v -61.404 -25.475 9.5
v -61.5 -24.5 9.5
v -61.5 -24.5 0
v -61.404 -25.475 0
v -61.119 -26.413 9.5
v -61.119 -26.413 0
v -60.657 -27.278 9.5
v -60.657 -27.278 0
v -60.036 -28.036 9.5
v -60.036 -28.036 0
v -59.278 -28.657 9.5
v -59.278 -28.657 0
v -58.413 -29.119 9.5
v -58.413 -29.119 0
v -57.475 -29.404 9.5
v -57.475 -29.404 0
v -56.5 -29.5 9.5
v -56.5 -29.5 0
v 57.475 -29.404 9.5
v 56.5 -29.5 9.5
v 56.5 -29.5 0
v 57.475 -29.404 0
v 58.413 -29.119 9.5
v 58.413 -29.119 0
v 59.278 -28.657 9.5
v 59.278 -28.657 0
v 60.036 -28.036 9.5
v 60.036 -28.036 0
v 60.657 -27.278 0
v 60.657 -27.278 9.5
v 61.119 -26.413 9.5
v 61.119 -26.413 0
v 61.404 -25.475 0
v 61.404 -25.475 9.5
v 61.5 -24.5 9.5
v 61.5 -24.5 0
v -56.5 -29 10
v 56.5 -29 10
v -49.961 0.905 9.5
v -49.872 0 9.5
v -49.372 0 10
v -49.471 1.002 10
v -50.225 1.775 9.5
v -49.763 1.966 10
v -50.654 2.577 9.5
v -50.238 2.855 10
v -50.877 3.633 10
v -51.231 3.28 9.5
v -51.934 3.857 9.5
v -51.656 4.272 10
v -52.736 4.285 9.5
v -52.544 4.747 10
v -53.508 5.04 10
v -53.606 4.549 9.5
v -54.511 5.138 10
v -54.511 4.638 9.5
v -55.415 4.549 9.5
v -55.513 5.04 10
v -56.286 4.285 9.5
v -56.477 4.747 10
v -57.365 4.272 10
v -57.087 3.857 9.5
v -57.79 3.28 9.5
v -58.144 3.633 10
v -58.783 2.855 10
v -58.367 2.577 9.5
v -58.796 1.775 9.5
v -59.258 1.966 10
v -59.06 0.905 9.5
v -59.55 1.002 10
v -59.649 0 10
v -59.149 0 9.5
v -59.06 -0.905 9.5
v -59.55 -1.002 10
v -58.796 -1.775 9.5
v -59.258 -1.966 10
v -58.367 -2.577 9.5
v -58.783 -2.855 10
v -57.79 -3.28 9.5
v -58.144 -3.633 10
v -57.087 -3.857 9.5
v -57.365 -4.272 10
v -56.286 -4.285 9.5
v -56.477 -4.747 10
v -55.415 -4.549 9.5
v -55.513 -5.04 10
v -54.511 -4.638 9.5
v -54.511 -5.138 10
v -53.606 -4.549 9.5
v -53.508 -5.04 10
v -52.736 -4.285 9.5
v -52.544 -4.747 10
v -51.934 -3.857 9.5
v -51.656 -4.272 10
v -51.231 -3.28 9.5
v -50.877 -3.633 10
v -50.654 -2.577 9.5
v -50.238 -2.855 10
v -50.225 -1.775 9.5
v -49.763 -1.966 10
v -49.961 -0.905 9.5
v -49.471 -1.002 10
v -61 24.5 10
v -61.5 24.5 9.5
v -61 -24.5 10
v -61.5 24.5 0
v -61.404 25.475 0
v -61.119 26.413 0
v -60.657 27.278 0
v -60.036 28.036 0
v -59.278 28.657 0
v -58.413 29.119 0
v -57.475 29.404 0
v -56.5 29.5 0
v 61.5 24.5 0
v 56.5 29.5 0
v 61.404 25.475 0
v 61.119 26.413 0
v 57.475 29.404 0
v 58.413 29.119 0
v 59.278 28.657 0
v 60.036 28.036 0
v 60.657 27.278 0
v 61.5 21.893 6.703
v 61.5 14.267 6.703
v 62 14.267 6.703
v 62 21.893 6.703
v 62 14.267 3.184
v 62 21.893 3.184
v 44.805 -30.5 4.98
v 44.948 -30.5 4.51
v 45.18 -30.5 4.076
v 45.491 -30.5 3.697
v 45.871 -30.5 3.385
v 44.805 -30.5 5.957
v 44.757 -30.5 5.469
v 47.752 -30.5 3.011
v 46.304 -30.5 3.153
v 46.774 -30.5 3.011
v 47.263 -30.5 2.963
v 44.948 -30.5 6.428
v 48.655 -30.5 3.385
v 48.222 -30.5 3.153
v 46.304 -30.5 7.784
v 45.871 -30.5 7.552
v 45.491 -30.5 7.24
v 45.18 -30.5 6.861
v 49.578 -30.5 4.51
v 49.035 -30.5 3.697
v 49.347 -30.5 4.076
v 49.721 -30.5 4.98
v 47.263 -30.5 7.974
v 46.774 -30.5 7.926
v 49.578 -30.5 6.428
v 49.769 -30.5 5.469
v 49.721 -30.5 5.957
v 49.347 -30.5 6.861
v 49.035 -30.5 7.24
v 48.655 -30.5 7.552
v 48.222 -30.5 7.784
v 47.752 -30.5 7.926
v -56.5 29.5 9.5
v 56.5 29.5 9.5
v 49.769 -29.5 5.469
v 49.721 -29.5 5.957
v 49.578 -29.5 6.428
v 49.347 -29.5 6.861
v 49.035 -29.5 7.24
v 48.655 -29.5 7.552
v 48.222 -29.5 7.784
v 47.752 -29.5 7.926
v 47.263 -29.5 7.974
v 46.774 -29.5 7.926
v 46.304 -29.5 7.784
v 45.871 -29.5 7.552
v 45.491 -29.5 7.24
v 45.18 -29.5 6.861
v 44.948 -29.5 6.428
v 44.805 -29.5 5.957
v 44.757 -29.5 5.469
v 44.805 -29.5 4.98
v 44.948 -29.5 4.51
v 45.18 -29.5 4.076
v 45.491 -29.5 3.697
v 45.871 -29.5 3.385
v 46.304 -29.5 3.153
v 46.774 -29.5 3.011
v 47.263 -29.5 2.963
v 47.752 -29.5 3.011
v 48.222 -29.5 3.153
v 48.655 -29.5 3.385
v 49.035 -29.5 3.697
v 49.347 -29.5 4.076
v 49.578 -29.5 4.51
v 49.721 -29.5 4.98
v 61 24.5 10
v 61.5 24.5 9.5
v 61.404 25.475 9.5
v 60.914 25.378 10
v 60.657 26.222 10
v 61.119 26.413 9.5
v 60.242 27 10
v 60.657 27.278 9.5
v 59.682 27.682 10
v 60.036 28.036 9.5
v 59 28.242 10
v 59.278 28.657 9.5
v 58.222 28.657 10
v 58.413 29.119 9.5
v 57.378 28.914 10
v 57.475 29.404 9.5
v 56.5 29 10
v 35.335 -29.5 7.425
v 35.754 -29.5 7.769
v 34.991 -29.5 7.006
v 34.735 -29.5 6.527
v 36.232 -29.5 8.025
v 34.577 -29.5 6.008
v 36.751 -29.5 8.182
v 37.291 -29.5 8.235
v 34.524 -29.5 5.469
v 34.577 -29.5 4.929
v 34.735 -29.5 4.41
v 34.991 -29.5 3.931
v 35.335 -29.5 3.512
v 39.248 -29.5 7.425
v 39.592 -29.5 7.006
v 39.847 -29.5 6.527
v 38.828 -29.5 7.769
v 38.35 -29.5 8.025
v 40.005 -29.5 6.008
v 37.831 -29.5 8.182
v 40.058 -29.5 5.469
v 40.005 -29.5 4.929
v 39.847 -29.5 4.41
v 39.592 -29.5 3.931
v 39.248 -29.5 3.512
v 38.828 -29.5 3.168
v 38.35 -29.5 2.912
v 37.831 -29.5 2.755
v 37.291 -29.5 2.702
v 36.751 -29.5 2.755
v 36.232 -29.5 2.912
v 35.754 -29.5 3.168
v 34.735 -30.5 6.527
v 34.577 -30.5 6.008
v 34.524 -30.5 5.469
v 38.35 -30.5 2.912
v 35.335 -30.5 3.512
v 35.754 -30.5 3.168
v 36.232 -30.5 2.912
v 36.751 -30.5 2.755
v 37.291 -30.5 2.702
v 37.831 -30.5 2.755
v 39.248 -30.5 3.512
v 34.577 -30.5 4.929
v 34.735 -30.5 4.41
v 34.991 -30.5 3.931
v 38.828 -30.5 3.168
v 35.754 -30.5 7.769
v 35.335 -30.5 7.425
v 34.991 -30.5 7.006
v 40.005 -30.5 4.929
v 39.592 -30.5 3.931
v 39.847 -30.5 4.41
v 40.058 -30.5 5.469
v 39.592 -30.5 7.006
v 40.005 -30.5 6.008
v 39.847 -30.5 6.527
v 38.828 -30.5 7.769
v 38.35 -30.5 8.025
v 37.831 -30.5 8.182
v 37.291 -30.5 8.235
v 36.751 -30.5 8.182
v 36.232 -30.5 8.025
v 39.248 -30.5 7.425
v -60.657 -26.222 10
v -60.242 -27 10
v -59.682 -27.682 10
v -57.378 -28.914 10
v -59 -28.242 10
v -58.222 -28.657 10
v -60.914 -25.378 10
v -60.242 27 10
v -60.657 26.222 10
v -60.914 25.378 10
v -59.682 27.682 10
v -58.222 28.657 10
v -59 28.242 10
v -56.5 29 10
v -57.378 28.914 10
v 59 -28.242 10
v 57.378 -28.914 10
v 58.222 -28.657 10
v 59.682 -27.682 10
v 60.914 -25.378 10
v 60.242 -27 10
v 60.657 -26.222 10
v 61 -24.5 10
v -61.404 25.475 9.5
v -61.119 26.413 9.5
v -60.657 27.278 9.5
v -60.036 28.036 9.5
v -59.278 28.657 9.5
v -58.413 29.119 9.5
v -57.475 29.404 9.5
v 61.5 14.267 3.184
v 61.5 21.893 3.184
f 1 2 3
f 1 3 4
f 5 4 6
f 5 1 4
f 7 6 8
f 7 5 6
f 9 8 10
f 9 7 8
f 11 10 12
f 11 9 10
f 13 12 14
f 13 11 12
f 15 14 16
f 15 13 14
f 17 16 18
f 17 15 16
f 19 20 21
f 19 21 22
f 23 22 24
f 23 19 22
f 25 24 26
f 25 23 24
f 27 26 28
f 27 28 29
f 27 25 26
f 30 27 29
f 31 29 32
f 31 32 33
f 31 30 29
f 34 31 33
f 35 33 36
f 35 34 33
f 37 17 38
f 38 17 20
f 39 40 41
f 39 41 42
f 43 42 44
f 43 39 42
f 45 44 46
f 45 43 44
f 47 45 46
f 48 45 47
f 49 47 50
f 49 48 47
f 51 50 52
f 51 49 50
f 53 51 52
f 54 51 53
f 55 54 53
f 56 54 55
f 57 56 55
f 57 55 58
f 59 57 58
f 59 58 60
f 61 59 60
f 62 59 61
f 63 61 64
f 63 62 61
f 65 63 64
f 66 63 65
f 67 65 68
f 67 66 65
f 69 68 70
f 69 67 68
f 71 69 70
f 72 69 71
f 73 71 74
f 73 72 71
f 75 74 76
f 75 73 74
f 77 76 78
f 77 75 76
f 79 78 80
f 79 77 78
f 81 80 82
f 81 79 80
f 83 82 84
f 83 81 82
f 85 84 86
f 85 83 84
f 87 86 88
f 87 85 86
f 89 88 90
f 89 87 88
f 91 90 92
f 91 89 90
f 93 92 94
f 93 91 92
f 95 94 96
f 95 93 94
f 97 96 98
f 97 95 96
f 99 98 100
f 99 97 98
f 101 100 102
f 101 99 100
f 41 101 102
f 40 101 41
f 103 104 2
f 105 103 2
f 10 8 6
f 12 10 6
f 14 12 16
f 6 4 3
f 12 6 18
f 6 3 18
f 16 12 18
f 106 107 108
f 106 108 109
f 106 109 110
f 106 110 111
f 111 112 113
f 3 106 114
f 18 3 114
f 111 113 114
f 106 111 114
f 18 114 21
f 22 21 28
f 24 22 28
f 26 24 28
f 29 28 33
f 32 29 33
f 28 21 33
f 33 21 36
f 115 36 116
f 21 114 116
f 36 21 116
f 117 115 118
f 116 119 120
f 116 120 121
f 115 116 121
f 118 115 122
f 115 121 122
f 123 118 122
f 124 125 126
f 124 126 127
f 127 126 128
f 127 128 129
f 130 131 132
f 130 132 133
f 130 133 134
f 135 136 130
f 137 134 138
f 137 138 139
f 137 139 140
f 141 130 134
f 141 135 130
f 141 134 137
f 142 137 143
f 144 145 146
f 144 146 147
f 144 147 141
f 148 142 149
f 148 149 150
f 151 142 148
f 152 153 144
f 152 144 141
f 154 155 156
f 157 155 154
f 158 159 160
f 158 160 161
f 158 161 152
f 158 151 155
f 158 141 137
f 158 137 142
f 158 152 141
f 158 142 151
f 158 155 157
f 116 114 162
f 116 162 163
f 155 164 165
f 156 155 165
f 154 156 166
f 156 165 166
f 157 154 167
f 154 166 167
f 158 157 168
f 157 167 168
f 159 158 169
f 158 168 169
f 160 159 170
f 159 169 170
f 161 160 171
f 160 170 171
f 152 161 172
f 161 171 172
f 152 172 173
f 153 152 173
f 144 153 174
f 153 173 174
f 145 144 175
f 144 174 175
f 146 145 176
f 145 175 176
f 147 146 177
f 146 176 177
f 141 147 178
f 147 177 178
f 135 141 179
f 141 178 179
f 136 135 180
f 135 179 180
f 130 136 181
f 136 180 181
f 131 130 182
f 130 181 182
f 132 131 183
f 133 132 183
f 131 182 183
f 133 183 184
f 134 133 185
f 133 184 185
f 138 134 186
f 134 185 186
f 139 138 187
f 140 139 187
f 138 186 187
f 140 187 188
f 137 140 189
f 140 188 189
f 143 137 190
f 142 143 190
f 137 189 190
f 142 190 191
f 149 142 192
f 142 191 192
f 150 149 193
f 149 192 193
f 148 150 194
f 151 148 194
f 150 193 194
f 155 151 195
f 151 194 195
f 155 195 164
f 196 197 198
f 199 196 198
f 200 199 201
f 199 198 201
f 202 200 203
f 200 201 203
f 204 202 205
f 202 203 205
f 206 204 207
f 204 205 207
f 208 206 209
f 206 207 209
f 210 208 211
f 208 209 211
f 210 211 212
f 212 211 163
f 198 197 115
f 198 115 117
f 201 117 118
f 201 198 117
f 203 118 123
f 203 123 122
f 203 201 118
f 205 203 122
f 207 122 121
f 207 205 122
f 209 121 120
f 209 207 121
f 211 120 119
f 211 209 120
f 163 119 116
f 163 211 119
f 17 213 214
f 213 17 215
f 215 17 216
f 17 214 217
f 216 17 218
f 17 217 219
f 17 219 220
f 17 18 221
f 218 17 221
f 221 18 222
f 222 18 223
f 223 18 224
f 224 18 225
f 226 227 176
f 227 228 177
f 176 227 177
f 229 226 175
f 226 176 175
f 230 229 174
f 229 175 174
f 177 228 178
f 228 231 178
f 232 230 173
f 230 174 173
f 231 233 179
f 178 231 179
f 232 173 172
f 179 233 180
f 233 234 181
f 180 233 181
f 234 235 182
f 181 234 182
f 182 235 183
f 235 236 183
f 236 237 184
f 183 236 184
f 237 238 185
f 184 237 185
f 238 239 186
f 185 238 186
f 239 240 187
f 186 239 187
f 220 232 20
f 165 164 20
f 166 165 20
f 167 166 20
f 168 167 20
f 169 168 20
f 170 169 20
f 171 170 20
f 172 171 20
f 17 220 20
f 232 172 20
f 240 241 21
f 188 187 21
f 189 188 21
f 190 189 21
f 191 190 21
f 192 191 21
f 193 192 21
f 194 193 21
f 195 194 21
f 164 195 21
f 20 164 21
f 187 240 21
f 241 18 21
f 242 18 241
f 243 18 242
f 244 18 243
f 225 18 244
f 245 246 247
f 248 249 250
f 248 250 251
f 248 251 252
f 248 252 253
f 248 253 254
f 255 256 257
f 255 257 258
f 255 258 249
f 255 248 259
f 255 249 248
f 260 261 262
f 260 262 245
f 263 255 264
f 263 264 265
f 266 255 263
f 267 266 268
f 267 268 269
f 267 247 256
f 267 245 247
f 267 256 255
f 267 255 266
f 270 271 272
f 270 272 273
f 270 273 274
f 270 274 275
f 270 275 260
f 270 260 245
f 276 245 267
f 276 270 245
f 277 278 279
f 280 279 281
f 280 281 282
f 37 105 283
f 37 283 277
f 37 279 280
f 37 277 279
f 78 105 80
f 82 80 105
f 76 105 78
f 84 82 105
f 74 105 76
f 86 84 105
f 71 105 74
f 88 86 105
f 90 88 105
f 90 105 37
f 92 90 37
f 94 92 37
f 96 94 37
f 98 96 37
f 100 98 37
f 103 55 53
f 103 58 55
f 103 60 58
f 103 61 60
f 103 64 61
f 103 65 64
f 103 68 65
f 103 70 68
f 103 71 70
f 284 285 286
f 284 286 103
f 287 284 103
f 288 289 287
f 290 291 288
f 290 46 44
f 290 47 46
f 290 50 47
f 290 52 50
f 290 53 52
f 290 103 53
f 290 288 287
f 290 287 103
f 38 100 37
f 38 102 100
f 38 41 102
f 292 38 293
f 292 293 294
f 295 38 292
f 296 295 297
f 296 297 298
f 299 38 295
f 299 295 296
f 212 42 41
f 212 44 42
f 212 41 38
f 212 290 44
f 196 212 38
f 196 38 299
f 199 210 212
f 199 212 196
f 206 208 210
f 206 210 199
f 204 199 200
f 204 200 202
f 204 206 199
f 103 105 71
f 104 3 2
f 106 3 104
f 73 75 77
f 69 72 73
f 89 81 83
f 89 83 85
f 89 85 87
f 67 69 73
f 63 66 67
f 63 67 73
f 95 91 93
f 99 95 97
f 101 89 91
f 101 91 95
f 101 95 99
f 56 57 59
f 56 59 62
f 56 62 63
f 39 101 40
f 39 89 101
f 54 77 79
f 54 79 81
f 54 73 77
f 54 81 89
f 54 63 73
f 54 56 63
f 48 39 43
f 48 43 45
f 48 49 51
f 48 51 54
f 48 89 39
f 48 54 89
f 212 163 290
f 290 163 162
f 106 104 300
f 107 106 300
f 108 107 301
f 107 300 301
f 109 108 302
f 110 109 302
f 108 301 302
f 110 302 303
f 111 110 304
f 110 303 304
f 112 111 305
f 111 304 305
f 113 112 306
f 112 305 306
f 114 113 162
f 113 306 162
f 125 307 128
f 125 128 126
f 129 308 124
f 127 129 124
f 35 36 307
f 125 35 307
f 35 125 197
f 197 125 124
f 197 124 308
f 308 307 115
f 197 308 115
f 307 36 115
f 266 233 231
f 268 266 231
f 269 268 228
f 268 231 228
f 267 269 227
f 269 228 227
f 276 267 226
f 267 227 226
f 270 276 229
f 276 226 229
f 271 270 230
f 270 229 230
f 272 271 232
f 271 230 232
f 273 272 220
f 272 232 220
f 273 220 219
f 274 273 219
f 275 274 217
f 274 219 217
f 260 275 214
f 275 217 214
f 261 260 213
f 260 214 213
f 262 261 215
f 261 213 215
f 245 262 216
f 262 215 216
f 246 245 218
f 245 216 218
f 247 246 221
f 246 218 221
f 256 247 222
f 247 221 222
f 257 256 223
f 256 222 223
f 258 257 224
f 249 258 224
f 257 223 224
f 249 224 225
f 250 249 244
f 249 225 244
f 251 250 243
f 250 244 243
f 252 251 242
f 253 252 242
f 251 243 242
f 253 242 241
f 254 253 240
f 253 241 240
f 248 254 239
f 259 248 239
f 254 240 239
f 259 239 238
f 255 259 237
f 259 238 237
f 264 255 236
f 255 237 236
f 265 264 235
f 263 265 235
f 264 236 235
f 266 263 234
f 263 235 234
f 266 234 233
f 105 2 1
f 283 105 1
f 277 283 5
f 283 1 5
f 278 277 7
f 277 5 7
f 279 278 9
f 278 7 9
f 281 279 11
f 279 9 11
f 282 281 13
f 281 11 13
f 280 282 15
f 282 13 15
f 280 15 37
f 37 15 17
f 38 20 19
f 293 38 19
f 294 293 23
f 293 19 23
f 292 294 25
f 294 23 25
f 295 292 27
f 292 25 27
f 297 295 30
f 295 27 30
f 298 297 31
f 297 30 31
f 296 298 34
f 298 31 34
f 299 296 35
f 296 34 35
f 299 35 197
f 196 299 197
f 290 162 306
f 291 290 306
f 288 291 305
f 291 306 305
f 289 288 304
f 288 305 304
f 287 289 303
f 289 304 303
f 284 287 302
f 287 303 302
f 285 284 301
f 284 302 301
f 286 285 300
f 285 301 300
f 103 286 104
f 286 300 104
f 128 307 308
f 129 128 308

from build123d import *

# Parameters (mm, degrees)
F0_W     = 123
F0_H     = 59
F1_DEPTH = 10
F2_R     = 5
F3_R     = 5
F4_R     = 2.7669489105
F4_R_2   = 2.5059208377
F5_DEPTH = 1
F6_W     = 7.6256990433
F6_H     = 3.5195555538
F7_DEPTH = 0.5
F8_R     = 4.6382964955
F9_DEPTH = 0.5
F10_SIZE = 0.49999


# Not quite as in the source:
# - a fillet or chamfer is up to 0.001 mm smaller than in the source, because OpenCascade refuses the exact size


with BuildPart() as f1:
    # F0 (on Top) → F1 (new body)
    with BuildSketch(Plane.XY):
        Rectangle(F0_W, F0_H)
    extrude(amount=F1_DEPTH)

    # F2
    f2_edges = [f1.edges().sort_by_distance(p)[0] for p in [
        (-61.5, 29.5, 5),
        (61.5, 29.5, 5),
    ]]
    fillet(f2_edges, radius=F2_R)

    # F3
    f3_edges = [f1.edges().sort_by_distance(p)[0] for p in [
        (-61.5, -29.5, 5),
        (61.5, -29.5, 5),
    ]]
    fillet(f3_edges, radius=F3_R)

    # F4 (on face) → F5 (join)
    with BuildSketch(Plane.XZ.offset(29.5)):
        with Locations((37.291161716, 5.468532443)):
            Circle(F4_R)
        with Locations((47.2632274032, 5.468532443)):
            Circle(F4_R_2)
    extrude(amount=F5_DEPTH)

    # F6 (on face) → F7 (join)
    with BuildSketch(Plane.YZ.offset(61.5)):
        with Locations((18.0802661926, 4.9434783868)):
            Rectangle(F6_W, F6_H)
    extrude(amount=F7_DEPTH)

    # F8 (on face) → F9 (cut)
    with BuildSketch(Plane.XY.offset(10)):
        with Locations((-54.5105189085, 0)):
            Circle(F8_R)
    extrude(amount=-F9_DEPTH, mode=Mode.SUBTRACT)

    # F10 (size 0.5 in the source; OpenCascade refuses exactly that, so slightly less here)
    f10_edges = [f1.edges().sort_by_distance(p)[0] for p in [
        (61.5, 0, 10),
        (60.035534, -28.035534, 10),
        (60.035534, 28.035534, 10),
        (0, -29.5, 10),
        (0, 29.5, 10),
        (-60.035534, -28.035534, 10),
        (-60.035534, 28.035534, 10),
        (-61.5, 0, 10),
        (-59.148815, 0, 10),
    ]]
    chamfer(f10_edges, length=F10_SIZE)


solid = f1.part
